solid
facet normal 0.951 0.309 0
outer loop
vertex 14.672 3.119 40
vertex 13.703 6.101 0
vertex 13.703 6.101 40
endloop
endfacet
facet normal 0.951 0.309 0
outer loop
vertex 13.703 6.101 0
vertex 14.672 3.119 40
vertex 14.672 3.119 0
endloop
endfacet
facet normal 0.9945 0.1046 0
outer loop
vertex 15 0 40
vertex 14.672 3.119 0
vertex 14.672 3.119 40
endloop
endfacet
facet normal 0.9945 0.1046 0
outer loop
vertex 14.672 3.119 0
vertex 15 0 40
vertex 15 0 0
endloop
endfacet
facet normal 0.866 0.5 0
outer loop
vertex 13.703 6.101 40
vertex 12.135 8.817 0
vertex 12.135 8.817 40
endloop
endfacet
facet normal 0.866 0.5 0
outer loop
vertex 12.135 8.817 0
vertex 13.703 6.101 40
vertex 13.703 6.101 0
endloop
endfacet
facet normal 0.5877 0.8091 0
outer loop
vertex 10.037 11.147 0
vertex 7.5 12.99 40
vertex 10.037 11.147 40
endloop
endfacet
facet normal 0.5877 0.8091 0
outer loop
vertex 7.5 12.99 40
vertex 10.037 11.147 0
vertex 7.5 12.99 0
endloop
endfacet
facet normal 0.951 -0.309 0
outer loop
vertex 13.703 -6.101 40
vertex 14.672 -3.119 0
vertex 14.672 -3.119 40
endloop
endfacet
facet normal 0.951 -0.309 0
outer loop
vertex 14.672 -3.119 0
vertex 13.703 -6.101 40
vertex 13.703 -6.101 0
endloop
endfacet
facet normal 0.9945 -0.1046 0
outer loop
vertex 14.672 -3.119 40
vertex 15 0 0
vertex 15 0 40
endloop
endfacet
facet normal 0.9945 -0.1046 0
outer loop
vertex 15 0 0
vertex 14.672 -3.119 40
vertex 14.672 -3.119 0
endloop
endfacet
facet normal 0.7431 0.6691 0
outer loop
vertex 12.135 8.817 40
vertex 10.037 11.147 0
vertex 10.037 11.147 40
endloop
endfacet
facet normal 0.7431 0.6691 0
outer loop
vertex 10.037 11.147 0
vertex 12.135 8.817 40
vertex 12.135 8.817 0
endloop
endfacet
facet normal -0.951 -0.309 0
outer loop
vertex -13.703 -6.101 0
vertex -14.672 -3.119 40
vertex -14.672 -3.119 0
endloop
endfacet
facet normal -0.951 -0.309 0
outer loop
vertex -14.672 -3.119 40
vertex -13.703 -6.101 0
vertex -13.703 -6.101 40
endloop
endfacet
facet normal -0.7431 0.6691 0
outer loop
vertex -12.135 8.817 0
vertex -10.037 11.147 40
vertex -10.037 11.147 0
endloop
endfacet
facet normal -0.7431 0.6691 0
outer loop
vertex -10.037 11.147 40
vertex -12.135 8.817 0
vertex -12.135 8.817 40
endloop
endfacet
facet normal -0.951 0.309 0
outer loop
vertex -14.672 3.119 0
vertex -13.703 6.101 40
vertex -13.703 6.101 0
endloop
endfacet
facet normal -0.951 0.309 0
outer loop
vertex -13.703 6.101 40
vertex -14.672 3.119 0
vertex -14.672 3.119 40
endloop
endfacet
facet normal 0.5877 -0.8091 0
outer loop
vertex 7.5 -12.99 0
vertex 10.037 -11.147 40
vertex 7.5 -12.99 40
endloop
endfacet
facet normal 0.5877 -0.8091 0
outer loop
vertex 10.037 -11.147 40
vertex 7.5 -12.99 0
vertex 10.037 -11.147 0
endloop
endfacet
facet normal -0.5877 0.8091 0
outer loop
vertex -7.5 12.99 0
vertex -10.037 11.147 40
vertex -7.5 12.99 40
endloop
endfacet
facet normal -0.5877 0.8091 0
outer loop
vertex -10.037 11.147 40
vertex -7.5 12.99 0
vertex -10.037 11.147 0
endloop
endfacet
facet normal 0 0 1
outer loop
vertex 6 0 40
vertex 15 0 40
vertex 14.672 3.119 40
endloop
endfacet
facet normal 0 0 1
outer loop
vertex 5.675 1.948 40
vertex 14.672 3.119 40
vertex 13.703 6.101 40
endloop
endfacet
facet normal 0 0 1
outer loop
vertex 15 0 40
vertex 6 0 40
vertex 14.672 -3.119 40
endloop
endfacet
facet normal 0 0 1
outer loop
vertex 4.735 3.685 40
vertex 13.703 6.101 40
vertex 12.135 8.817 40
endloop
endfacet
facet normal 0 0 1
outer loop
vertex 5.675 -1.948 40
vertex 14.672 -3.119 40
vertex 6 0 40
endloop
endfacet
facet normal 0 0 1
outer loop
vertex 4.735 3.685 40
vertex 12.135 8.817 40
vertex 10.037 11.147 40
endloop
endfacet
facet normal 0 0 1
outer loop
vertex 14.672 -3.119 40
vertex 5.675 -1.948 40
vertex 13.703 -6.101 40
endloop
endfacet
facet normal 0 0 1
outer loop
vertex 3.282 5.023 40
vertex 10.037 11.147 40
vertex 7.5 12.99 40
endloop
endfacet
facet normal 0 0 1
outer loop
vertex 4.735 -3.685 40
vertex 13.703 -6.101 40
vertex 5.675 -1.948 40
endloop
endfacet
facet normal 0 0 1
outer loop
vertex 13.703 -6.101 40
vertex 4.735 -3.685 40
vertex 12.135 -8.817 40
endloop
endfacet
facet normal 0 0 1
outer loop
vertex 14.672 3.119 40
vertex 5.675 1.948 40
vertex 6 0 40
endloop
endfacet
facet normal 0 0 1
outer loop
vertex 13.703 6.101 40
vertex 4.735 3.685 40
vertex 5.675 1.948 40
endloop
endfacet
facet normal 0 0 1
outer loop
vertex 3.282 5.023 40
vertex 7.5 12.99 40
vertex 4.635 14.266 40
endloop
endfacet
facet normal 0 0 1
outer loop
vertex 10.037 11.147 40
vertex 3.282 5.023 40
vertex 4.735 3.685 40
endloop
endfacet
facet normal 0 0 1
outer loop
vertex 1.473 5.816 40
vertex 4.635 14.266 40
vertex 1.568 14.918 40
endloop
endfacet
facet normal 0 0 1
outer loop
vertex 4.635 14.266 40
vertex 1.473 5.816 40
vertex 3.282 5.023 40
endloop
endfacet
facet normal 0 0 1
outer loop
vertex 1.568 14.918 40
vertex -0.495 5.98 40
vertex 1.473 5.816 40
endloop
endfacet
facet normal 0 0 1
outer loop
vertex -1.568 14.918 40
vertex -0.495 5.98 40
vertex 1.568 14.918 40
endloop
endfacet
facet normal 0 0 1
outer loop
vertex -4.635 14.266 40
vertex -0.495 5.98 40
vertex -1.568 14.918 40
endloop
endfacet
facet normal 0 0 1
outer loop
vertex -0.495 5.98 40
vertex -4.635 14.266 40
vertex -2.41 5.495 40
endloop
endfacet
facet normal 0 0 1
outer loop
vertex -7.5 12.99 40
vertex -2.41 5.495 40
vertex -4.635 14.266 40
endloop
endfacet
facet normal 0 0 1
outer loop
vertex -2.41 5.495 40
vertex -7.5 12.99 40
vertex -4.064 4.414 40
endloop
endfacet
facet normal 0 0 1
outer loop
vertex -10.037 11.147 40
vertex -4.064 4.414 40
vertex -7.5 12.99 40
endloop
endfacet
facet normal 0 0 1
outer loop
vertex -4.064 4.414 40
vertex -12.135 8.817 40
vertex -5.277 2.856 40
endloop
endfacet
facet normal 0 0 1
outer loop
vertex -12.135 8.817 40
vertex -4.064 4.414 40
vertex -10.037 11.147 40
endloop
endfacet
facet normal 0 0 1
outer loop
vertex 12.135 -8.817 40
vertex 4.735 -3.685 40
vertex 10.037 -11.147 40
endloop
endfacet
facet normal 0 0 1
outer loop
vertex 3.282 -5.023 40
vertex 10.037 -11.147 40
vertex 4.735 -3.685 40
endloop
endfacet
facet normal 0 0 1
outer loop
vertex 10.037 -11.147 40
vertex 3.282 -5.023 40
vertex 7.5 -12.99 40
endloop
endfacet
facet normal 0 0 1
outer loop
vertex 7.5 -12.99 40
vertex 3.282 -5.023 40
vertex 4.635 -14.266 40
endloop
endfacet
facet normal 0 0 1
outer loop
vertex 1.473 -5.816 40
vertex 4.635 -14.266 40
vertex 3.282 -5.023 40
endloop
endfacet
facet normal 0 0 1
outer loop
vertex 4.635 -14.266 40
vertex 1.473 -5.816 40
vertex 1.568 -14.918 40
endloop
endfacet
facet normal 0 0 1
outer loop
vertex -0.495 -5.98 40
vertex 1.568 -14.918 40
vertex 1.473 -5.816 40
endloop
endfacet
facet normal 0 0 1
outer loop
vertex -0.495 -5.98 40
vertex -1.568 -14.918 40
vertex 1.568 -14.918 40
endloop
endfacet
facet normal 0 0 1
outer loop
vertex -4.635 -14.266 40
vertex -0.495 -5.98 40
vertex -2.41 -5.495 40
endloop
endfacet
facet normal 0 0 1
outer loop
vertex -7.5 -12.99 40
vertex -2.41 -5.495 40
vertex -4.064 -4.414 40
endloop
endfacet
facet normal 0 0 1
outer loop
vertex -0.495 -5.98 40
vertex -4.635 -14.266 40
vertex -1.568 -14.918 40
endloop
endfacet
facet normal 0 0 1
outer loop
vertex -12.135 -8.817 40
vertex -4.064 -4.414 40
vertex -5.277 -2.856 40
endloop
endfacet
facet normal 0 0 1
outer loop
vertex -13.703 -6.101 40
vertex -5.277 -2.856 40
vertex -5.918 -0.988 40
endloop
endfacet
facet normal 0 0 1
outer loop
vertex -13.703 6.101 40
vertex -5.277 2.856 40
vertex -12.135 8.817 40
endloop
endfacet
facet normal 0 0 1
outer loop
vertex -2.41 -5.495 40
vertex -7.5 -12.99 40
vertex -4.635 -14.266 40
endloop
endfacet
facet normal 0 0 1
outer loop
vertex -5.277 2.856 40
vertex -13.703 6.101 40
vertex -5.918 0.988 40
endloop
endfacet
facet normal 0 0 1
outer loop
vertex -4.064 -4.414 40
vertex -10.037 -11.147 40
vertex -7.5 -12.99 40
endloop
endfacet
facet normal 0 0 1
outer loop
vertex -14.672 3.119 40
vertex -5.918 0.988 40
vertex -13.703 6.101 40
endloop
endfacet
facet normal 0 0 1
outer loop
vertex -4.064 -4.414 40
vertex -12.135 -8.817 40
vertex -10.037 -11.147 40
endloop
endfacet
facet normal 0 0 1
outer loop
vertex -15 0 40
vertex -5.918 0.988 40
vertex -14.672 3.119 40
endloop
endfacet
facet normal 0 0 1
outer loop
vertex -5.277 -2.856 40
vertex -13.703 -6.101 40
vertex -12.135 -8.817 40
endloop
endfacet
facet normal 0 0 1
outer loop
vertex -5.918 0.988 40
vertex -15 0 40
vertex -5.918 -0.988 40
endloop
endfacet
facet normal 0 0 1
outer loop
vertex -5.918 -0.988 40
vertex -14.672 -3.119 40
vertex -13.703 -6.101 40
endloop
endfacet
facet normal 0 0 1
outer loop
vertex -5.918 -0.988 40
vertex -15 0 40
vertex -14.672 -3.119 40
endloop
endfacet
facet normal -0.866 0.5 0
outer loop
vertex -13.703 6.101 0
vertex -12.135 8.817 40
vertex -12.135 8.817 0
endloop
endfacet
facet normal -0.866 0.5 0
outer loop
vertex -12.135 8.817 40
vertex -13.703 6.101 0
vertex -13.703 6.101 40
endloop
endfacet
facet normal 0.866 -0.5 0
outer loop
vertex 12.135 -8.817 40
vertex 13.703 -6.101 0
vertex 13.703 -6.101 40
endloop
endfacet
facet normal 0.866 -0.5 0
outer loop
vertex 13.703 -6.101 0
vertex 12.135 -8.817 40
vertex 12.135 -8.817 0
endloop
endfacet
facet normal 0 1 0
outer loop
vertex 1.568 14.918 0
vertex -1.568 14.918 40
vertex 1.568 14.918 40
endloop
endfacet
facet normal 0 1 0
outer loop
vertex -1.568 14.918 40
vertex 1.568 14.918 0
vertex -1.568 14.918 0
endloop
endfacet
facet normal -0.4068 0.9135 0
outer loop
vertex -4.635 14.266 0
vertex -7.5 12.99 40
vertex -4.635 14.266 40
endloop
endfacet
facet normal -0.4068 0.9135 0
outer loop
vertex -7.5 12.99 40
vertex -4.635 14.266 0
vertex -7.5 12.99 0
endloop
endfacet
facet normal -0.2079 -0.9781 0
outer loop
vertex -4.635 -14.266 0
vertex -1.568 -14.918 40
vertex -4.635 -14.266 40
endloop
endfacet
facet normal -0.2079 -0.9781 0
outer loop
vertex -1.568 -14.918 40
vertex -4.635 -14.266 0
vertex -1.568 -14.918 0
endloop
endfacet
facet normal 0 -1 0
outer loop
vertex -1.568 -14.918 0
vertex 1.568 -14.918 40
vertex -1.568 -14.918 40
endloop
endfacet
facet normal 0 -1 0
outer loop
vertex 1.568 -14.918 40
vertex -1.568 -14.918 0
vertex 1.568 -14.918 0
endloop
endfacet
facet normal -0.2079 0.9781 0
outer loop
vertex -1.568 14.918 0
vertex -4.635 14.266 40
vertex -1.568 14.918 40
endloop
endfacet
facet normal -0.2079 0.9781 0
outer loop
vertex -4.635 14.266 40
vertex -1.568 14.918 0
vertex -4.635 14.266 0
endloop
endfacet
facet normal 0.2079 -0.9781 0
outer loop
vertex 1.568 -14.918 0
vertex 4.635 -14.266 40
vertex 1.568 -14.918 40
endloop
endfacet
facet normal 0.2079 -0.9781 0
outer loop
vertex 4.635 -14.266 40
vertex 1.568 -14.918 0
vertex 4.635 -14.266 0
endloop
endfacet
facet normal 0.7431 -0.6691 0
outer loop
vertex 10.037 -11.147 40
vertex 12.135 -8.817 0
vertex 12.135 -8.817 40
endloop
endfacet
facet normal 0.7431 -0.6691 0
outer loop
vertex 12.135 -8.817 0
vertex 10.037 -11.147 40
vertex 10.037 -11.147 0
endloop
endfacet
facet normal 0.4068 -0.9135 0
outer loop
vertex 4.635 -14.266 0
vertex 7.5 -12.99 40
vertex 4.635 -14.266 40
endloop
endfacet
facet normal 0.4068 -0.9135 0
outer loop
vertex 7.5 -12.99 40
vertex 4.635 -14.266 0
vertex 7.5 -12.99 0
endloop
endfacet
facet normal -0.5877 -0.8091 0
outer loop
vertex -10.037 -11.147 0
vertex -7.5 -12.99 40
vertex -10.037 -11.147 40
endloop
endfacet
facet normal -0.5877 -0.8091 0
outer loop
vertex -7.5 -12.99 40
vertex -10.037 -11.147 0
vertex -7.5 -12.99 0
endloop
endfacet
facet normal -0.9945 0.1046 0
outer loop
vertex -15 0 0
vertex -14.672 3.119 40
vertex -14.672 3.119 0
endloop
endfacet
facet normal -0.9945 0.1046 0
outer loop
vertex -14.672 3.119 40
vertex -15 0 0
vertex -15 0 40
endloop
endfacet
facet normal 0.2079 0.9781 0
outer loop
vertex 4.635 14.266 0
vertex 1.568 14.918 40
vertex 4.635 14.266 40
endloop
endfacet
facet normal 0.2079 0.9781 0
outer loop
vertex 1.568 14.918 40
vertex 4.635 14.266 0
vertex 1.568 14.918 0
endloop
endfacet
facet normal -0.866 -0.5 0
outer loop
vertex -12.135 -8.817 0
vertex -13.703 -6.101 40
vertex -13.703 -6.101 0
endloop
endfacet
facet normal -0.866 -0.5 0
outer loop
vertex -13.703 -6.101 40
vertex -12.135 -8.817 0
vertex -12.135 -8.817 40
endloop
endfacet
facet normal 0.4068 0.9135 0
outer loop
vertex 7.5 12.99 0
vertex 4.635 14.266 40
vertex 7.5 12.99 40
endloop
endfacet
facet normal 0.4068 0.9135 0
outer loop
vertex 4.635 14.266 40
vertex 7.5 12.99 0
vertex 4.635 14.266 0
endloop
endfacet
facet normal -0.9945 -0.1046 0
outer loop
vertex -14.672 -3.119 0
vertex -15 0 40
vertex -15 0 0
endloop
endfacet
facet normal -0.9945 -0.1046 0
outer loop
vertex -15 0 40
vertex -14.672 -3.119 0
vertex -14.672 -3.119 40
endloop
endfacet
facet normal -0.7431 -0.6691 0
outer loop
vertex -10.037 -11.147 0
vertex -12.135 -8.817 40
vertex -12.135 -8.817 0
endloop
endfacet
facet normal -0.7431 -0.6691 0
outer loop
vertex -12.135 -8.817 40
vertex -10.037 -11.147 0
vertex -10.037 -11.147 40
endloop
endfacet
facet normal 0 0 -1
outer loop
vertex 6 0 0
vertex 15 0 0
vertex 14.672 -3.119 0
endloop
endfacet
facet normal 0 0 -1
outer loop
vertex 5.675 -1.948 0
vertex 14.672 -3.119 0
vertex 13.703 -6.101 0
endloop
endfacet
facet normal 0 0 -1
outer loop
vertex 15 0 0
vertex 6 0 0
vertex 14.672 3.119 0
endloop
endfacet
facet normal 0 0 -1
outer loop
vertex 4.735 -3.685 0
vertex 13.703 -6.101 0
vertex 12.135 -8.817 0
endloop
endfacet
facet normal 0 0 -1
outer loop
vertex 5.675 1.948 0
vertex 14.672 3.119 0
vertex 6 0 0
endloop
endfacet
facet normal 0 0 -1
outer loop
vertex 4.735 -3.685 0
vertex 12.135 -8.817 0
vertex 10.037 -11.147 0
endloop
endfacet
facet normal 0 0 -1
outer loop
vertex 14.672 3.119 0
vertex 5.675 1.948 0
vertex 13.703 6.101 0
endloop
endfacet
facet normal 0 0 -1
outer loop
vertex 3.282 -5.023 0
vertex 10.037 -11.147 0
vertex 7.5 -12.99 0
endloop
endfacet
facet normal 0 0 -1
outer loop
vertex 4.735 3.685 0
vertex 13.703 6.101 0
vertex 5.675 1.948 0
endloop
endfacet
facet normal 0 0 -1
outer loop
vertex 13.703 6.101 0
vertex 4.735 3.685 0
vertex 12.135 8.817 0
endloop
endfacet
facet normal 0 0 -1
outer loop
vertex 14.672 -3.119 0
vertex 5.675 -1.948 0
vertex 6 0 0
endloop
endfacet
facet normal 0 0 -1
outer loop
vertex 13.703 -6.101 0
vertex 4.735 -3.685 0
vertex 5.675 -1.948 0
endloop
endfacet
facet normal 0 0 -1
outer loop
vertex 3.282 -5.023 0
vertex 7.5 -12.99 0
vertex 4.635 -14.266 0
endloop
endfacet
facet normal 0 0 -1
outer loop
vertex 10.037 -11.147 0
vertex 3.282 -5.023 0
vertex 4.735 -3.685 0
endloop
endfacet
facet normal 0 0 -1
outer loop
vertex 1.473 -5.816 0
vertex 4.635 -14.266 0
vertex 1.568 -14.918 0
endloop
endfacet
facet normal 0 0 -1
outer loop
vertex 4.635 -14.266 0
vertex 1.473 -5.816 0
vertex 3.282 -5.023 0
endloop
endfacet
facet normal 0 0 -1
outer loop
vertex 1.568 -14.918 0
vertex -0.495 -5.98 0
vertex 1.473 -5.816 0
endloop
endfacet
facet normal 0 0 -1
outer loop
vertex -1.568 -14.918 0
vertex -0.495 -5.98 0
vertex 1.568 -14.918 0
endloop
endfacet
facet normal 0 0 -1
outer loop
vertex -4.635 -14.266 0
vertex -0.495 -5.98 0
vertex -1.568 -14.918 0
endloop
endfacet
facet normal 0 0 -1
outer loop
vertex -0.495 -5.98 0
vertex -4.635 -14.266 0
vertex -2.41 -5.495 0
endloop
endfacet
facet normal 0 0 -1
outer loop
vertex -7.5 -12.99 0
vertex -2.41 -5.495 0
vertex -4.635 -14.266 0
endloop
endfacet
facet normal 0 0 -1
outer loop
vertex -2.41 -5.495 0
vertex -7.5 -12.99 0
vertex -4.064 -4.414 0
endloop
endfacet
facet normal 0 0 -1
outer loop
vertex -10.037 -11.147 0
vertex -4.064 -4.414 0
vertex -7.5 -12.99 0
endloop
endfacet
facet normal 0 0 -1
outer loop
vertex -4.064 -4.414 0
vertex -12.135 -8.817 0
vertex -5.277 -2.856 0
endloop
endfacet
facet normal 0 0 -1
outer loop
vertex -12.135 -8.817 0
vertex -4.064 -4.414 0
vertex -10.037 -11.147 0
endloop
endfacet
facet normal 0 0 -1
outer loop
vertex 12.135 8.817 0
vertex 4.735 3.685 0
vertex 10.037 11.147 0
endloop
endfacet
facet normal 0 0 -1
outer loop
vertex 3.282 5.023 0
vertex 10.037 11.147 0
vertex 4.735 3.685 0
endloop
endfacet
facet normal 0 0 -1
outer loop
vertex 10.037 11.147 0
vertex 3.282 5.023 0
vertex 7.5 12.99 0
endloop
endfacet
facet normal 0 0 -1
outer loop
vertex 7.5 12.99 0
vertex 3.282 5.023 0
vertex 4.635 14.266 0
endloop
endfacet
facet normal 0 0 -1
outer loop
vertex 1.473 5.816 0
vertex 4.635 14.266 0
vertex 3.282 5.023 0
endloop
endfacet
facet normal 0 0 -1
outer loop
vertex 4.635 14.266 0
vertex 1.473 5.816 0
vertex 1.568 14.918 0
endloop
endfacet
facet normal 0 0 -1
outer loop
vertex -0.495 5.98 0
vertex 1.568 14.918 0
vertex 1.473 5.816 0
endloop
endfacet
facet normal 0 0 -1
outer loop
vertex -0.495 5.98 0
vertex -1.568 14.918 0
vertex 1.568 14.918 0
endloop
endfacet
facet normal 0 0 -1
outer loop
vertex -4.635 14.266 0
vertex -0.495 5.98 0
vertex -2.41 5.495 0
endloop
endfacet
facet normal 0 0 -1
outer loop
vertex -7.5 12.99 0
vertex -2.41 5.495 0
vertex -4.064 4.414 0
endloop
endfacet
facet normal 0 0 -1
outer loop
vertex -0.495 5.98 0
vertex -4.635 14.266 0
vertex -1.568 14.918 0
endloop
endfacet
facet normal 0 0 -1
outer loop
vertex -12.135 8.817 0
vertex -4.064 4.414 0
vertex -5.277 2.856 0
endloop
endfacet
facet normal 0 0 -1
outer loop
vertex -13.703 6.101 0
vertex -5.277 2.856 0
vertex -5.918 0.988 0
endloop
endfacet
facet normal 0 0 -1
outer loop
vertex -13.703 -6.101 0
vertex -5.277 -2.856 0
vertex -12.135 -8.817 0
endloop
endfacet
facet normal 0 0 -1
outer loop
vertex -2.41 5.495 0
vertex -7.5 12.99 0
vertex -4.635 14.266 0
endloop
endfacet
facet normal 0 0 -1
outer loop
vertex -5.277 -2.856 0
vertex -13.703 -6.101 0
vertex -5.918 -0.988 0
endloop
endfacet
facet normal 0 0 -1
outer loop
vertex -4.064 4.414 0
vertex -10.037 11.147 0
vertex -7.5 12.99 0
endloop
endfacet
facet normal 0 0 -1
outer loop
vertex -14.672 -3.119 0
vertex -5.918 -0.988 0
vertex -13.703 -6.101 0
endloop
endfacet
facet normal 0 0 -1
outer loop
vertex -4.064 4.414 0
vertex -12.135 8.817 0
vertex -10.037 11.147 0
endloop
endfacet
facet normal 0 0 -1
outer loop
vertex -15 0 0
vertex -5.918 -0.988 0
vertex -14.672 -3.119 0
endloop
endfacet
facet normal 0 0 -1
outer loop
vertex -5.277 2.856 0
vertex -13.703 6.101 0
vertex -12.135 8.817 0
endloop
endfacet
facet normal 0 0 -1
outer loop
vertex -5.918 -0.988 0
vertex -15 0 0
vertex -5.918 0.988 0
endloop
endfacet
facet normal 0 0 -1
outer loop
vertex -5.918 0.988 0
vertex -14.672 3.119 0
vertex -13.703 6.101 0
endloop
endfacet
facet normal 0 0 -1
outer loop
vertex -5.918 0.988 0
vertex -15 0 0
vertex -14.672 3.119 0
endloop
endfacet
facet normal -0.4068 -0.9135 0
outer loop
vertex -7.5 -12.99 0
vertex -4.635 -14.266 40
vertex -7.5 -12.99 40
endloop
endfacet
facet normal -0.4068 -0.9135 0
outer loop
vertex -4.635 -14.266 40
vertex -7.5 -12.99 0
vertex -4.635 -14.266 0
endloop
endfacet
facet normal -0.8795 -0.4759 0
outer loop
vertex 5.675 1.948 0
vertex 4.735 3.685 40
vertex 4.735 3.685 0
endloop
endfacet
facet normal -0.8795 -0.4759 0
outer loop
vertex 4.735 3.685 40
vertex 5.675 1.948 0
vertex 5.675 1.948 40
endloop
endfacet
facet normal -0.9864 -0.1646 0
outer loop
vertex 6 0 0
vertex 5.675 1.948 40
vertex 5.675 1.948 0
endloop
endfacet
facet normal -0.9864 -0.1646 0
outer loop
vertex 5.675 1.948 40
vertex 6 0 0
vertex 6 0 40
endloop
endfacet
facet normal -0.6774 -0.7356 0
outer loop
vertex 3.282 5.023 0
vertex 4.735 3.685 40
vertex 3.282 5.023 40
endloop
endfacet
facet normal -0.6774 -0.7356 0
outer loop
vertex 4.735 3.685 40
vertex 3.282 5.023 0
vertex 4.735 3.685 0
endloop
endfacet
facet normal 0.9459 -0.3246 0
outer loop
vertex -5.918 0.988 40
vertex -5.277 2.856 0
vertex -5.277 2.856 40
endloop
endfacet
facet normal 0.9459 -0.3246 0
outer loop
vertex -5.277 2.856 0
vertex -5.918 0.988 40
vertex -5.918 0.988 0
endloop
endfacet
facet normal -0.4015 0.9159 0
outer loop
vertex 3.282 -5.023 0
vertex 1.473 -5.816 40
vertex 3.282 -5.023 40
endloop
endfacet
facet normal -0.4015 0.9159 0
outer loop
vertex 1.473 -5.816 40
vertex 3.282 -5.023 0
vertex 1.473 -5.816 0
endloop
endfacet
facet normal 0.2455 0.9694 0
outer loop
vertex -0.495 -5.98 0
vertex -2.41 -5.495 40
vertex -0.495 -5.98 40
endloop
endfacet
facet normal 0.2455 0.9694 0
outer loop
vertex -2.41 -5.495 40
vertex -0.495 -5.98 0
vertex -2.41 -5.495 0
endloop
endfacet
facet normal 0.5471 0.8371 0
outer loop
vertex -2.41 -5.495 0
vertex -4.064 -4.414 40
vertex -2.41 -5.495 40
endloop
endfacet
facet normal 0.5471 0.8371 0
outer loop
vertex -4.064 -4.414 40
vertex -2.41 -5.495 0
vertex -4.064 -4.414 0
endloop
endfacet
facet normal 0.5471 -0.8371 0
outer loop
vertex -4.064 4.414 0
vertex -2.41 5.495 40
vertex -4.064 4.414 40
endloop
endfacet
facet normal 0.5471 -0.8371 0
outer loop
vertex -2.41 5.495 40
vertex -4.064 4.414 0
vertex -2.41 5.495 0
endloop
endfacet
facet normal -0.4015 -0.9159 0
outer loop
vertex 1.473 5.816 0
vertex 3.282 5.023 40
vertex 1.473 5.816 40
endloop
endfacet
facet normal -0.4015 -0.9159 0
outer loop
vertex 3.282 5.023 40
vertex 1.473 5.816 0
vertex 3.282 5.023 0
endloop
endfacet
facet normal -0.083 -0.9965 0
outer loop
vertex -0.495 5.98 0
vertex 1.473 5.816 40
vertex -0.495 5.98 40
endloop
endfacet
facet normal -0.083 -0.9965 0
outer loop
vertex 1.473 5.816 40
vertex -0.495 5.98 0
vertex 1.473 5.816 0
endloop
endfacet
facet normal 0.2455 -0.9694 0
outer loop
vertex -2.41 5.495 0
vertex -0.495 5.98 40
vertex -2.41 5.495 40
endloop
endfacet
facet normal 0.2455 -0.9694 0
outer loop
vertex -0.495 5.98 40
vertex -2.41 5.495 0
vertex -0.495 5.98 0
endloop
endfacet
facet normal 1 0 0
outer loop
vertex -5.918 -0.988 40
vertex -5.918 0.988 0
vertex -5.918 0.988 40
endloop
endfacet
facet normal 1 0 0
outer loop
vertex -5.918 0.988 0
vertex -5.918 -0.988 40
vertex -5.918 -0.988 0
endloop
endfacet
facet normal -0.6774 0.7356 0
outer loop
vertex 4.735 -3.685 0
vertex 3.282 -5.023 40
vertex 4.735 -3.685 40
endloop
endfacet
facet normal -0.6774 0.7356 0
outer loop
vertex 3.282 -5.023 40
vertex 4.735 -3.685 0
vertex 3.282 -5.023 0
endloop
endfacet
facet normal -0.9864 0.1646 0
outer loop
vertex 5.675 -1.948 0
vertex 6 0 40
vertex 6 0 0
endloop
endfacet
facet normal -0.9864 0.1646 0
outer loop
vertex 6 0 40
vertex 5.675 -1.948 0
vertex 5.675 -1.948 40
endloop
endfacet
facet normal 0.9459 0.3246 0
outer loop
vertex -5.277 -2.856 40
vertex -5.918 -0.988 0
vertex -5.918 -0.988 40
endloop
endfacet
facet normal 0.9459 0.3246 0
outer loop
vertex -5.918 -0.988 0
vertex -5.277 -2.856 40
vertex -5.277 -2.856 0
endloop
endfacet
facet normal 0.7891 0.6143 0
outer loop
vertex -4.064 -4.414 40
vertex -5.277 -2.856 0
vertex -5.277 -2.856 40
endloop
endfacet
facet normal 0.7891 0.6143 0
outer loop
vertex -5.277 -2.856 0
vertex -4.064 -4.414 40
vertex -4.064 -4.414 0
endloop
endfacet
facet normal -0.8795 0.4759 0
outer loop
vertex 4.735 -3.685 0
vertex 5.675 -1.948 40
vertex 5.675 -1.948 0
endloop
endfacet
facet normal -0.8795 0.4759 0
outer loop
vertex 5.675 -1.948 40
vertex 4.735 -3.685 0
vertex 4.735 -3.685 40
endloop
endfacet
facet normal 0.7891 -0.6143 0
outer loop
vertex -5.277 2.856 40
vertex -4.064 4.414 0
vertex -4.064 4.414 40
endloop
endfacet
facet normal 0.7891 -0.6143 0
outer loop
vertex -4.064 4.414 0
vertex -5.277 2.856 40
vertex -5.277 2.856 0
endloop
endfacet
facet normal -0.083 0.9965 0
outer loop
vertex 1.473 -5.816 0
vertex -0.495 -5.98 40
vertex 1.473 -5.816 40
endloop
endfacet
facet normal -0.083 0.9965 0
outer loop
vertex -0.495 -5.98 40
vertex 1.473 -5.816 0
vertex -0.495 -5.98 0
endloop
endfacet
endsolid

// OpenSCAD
// Baseline for the boolean/topology CGAL cases: a tube (cylinder with a
// coaxial hole) 30 mm OD, 12 mm ID, 40 mm tall.
OD = 30;
ID = 12;
HGT = 40;

module outer_cyl() {
  cylinder(h=HGT, d=OD);
}

module inner_hole() {
  cylinder(h=HGT, d=ID);
}

difference() {
  outer_cyl();
  inner_hole();
}
